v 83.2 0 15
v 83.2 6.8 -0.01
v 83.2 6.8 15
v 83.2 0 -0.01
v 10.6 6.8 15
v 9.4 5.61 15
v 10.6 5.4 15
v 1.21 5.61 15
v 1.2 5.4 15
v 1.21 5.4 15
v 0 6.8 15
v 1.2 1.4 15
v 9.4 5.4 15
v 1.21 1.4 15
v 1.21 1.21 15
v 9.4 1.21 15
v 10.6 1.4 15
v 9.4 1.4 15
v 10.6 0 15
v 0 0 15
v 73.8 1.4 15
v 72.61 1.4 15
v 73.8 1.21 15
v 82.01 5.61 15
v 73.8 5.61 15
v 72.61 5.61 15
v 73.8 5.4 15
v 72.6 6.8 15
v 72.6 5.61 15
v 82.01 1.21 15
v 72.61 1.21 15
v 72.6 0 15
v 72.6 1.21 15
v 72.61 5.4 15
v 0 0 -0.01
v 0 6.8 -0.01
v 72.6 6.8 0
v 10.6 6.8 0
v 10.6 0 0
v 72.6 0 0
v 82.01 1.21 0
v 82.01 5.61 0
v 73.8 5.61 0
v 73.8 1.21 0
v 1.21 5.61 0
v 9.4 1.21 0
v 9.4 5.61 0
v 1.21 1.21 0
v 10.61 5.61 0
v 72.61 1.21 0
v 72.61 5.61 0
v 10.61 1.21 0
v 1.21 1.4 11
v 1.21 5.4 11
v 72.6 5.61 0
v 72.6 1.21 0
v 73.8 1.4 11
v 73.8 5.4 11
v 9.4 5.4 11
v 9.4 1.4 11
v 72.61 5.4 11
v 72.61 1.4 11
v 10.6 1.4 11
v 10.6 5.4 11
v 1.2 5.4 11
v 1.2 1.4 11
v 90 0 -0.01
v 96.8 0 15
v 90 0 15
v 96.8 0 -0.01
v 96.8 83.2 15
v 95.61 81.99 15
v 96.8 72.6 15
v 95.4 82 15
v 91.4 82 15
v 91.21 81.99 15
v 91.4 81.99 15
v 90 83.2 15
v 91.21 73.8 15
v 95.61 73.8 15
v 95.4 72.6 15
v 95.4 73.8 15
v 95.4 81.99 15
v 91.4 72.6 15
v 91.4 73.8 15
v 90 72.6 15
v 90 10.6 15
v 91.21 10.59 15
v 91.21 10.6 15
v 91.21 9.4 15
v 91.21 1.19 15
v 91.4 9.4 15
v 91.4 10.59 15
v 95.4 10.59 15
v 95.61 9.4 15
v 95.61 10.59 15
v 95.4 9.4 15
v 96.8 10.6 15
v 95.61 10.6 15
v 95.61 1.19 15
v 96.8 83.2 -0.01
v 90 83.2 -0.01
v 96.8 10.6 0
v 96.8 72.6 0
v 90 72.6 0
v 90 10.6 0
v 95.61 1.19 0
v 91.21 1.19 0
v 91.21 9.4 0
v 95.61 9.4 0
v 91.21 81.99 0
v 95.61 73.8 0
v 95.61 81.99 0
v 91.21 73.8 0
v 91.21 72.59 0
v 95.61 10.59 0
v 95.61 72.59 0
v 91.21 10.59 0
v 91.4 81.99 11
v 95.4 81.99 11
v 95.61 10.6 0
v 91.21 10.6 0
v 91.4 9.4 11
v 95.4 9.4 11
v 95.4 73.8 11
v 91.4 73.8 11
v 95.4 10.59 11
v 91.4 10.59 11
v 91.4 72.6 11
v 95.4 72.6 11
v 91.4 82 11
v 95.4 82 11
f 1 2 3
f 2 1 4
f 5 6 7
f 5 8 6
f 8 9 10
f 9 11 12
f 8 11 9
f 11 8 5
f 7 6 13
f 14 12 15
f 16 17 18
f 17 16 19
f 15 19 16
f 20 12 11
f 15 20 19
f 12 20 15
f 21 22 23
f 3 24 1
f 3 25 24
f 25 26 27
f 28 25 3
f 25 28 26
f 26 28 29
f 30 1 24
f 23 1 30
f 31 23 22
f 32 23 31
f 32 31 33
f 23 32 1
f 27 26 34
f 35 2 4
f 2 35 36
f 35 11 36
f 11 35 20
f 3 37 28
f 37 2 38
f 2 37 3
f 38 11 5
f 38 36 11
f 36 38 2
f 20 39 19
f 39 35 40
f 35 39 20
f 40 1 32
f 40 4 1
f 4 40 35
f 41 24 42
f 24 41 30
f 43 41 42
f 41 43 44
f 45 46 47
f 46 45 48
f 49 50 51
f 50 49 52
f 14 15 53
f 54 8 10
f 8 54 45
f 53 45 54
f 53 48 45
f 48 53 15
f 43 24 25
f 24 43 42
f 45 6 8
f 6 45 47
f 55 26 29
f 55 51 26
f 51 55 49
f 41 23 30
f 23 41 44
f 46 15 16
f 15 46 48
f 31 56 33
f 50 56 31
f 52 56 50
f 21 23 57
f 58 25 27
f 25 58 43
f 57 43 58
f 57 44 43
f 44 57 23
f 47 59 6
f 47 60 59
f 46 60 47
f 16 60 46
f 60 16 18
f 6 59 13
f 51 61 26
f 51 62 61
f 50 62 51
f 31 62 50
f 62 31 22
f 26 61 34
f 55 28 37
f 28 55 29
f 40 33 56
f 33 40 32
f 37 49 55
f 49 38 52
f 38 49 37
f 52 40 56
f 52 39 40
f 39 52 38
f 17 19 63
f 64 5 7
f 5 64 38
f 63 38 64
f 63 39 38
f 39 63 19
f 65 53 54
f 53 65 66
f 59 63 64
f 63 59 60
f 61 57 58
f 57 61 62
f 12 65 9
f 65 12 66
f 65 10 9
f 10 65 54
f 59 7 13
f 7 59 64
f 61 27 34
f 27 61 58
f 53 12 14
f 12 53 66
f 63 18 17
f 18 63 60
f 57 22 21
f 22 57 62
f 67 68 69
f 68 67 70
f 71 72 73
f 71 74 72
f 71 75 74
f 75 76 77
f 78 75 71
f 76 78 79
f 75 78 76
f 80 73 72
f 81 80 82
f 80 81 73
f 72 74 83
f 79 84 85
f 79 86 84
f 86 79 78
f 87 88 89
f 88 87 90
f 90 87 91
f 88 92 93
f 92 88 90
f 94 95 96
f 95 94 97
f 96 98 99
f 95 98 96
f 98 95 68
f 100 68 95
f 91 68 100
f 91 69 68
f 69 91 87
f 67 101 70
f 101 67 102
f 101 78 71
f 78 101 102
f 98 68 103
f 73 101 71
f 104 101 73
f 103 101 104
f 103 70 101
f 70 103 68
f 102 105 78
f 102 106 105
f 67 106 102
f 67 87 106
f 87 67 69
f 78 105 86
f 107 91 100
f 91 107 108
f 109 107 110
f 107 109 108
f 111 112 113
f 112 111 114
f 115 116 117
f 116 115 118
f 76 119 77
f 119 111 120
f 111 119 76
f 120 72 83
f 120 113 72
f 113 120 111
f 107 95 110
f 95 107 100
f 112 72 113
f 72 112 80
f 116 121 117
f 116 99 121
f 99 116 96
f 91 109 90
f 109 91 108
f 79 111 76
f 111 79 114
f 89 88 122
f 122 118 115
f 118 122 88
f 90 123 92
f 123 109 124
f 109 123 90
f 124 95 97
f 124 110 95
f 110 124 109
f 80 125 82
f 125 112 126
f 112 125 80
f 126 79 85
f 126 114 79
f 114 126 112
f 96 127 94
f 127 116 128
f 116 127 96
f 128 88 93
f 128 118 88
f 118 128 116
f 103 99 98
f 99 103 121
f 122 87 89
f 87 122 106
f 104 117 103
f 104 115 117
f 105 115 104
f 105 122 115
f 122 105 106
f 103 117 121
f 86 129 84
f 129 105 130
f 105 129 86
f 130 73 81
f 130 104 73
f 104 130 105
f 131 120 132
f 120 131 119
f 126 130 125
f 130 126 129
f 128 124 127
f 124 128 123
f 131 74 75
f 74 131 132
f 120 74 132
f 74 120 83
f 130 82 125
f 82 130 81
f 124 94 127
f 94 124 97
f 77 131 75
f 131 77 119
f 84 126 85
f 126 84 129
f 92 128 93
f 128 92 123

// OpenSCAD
// file: ../../Base/Boxes.scad
// Fischertechnik Box Foundation
// Pre-designed Boxes

use <Constants.scad>

include <PlacementOptions.scad>

box190Width = 190;
box190Depth = 130;
box130Width = 130;
box130Depth = 95;

// Values are from an original ec3 box
topBottomDifference = 1.5;
outerHeight = 40;
baseThickness = 1.8;
innerHeight = outerHeight - baseThickness;
stackExcess = 5.7;
radius = 3.5;
wallThickness = 1.5;
tolerance = 0.2;

boxWallThickness = wallThickness;
boxBaseThickness = baseThickness;
boxWebWidth = 3.0;

// getBoxWallThickness()
// Gets the wall thickness of a Fischertechnik Box
function getBoxWallThickness() = boxWallThickness;

// getBoxUsageHeight(height = 38.2)
// Gets the usable height of a Fischertechnik box
// height = Outer height of the box from the bottom to the upper edge.
function getBoxUsageHeight(height = outerHeight) = height - baseThickness - stackExcess;

// getBoxInnerHeight()
// Gets the inner height of a Fischertechnik box, including the stack excess
function getBoxInnerHeight() = innerHeight;

// getBoxBaseThickness()
// Gets the thickness of the Fischertechnik box base.
function getBoxBaseThickness() = boxBaseThickness;

// getBoxWebWidth()
// Gets the width of a box web
function getBoxWebWidth() = boxWebWidth;

// getBox190Space()
// Gets the usable inner space of a Box 190 as an x/y-list
function getBox190Space() = [
    box190Width - 2*getBoxWallThickness() - topBottomDifference, 
    box190Depth - 2*getBoxWallThickness() - topBottomDifference ];

// RoundedCornerPlate(width, depth, height, radius)
// Creates a body plate with rounded corners for a box. Used
// also to create the complete box with the hull module.
// width = Width of the plate
// depth = depth of the plate 
// height = thickness of the plate
// radius = radius of the rounded corner
module RoundedCornerPlate(width, depth, height, radius) {
    translate([radius, radius])
    hull() {
        w = width-2*radius;
        d = depth-2*radius;
        cube([w, d, height]);
        cylinder(height, r=radius, $fn=getFragments());
        translate([w, 0])
            cylinder(height, r=radius, $fn=getFragments());
        translate([w, d])
            cylinder(height, r=radius, $fn=getFragments());
        translate([0, d])
            cylinder(height, r=radius, $fn=getFragments());
    }
}

// BoxBase(width, depth)
// Creates an empty stackable Fischertechnik compatible box
// width = Outer width of the box (190, 130, ...)
// depth = Outer depth of the box (130, 95, ...)

module BoxBase(width, depth, height=outerHeight) {    
    thinPlate = 0.01;

    innerHeight = height - baseThickness;    
    
    module Body(tolerance=tolerance) {
        hull() {
            // Bottom with tolerance to fit into the original boxes when stacked
            translate([-wallThickness+tolerance, -wallThickness+tolerance, -baseThickness])
                RoundedCornerPlate(width-topBottomDifference-2*tolerance, depth-topBottomDifference-2*tolerance, thinPlate, radius);
            
            // Top
            translate([-wallThickness-topBottomDifference/2, -wallThickness-topBottomDifference/2, innerHeight-thinPlate])
                RoundedCornerPlate(width, depth, thinPlate, radius);
         }
    }

    module Cutoff() {
        hull() {
            coWidth = width - 2*wallThickness;
            coDepth = depth - 2*wallThickness;
            
            // Bottom
            RoundedCornerPlate(coWidth-topBottomDifference, coDepth-topBottomDifference, thinPlate, radius);

            // Top
            translate([-topBottomDifference/2, -topBottomDifference/2, innerHeight+thinPlate]) 
                RoundedCornerPlate(coWidth, coDepth, thinPlate, radius);
        }
    }
    
    difference() {        
        Body();
        Cutoff();
        stackOffset = innerHeight - stackExcess;
        translate([0, 0, stackOffset + baseThickness])
            Body(tolerance=0);
    }
}

// Creates the Fischertechnik empty box 130x190 mm and places it at position 0,0
// 190x130 are the outer sizes, the inner space is slightly smaller. Use getBox190Space() to get the inner sizes.
// The box is positioned that the usable inner space is at the 0,0,0 position.

module Box190() {
    BoxBase(box190Width, box190Depth);
}

// Gets the usable inner space of a Box 130 as an x/y-list
function getBox130Space() = [
    box130Width - 2*getBoxWallThickness() - topBottomDifference, 
    box130Depth - 2*getBoxWallThickness() - topBottomDifference ];

// Creates the Fischertechnik empty box 95x130 mm and places it at position 0,0
// 190x130 are the outer sizes, the inner space is slightly smaller. Use getBox190Space() to get the inner sizes.
// The box is positioned that the usable inner space is at the 0,0,0 position.

module Box130() {
    BoxBase(box130Width, box130Depth);
}

// Creates a web at the specified box walls
// corner 0 = LowerLeft, 1 = UpperLeft, 2 = UpperRight, 3 = LowerRight
// side 0 = LeftOfCorner, 1 = RightOfCorner
// distance = Distance in mm from the corner
// boxSpace = inner width and depth of the box (default: Box 190)
// webWidth = length of the web (default is 3 mms)
// webThickness = thickness of the web (default is 1 mm)
// height = Height of the web (standard is getBoxUsageHeight())
// sink = How much of the web is sunk into the wall

module BoxWeb(
    corner, 
    side, 
    distance, 
    boxSpace=getBox190Space(), 
    webWidth=getBoxWebWidth(), 
    webThickness=1.0, 
    height=getBoxUsageHeight(),
    sink = getBoxWallThickness()/2) {
    width = (corner % 2 == 0) ? 
            (side == LeftOfCorner ? webWidth : webThickness) :
            (side == LeftOfCorner ? webThickness : webWidth);

    depth = (corner % 2 == 0) ? 
            (side == RightOfCorner ? webWidth : webThickness) :
            (side == RightOfCorner ? webThickness : webWidth);
    
    xDiff = corner == LowerLeft ? 
                (side == LeftOfCorner ? -sink : distance) :
            (corner == UpperLeft ?                
                (side == LeftOfCorner ? distance : -sink) :
            (corner == UpperRight ?
                (side == LeftOfCorner ? boxSpace.x-webWidth+sink : boxSpace.x-distance-webThickness) :
                (side == LeftOfCorner ? boxSpace.x-distance-webThickness: boxSpace.x-webWidth+sink)));

    yDiff = corner == LowerLeft ? 
                (side == RightOfCorner ? -sink : distance) :
            (corner == UpperLeft ?
                (side == RightOfCorner ? boxSpace.y-distance-webThickness : boxSpace.y-webWidth+sink) :
            (corner == UpperRight ?
                (side == RightOfCorner ? boxSpace.y-webWidth+sink : boxSpace.y-distance-webThickness) :
                (side == RightOfCorner ? distance : -sink)));
    
    translate([xDiff, yDiff, -getExcess()])
        cube([width, depth, height + 2*getExcess()]);
}
// file: ../../Base/Rotation.scad
// Fischertechnik Box Foundation
// Geometry Helpers Rotation

include <PlacementOptions.scad>

// getRotatedSpace(space, rotation=NoRotation)
// Rotates the space dependent on the specified rotation

function getRotatedSpace(space, rotation=NoRotation) = [
    (rotation == Rotate90 || rotation == Rotate270) ? space.y : space.x,
    (rotation == Rotate90 || rotation == Rotate270) ? space.x : space.y
];

// Rotates the given space around the fixed left lower corner
// space = the space the children needs as width/depth list [width,depth]
// rotation = 0 Rotate0 degrees, 1 Rotate90 degrees, 2 Rotate180 degrees, 3 Rotate270 degrees (equivalent to -90)

module RotateFix(space, rotation=NoRotation) {
    dy = (rotation == Rotate0 || rotation == Rotate270) ? 0 :
        (rotation == Rotate90) ? space.x :
        space.y;
    dx = (rotation < Rotate180) ? 0 :
        (rotation == Rotate180) ? space.x :
        space.y;
    
    translate([dx, dy, 0])
        rotate([0, 0, rotations[rotation]])
            children();
}
// file: ../../Base/Alignment.scad
// Fischertechnik Box Foundation
// Geometry Helpers Alignment

include <PlacementOptions.scad>

// getAlignedX(elementWidth, spaceWidth, align=AlignRight, offset=0)
// Gets the aligned X offset of an element with the given
// width in the given space.
// elementWidth = The width of the element to positon
// spaceWidth = The space where the element should be aligned
// align = 0 AlignLeft, 1 AlignCenter, 2 AlignRight
// offset = an optional offset from the aligned position. When
// aligned left or centered, then positive values are in X direction.
// When aligned right then positive values are in negative X direction.

function getAlignedX(elementWidth, spaceWidth, align=AlignRight, offset=0) =
    (align == AlignLeft) ?
        offset :
        ((align == AlignCenter) ?
        (spaceWidth - elementWidth)/2 + offset :
        spaceWidth - offset - elementWidth);

// getAlignedY(elementDepth, spaceDepth, align=AlignTop, offset=0)
// Gets the aligned Y offset of an element with the given
// depth in the given space.
// elementDepth = The depth of the element to positon
// spaceDepth = The space where the element should be aligned
// align = 0 AlignBottom, 1 AlignCenter, 2 AlignTop
// offset = an optional offset from the aligned position. When
// aligned bottom or centered, then positive values are in Y direction.
// When aligned top then positive values are in negative Y direction.

function getAlignedY(elementDepth, spaceDepth, align=AlignTop, offset=0) =
    (align == AlignBottom) ?
        offset :
        ((align == AlignCenter) ?
        (spaceDepth - elementDepth)/2 + offset :
        spaceDepth - offset - elementDepth);
// file: ../../Base/Constants.scad
// Fischertechnik Box Foundation
// Constants

// Constant values necessary for multiple elements

// Base constants
dividerThickness = 1.2;
excess = 0.01;
fragments = 90;
tolerance = 0.8;

// Gets the thickness of a divider 
function getDividerThickness() = dividerThickness;

// Gets the excess that is used to merge walls into each other
function getExcess() = excess;

// Gets amount of fragments of a cylinder
function getFragments() = fragments;

// Gets the inner tolerance of a frame to each side
function getTolerance() = tolerance;


// Fischertechnik specific constants
axisDiameter = 4;
axisBottomDiameter = axisDiameter + 1;
axisTolerance = 0.2;
axisLockingLength = 8;

// Gets axis diameter of Fischertechnik axis
function getAxisDiameter() = axisDiameter;

// Gets axis diameter tolerance (subtracted for element axis)
function getAxisTolerance() = axisTolerance;

// Gets the axis diameter for standing axis
function getStandAxisDiameter() = getAxisDiameter() - getAxisTolerance();

// Gets axis bottom diameter for thicker part at the bottom
function getAxisBottomDiameter() = axisBottomDiameter;

// Gets the lengthh of the locking part of a locking axis
function getAxisLockingLength() = axisLockingLength;

// Studs

studHeight = 2.5;
studTolerance = 0.2;
studRailDistance = 9;   // as in ft 50

// gets the height of a connecting stud
function getStudHeight() = studHeight;

// gets the connecting stud height tolerance
function getStudTolerance() = studTolerance;

// gets the default rail distance for studs
function getStudRailDistance() = studRailDistance;

// Dockable Frame with Edge

standardEdgeDistance = 2.5;
standardWebDistance = 11.5;
standardCornerLength = 15;

// gets the standard distance to the wall of the box for dockable frames with webs
function getStandardEdgeDistance() = standardEdgeDistance;

// gets the standard distance of each web to the corner of the dockable frame
function getStandardWebDistance() = standardWebDistance;

// gets the standard length of the corner walls of a dockable frame
function getStandardCornerLength() = standardCornerLength;

// Tubes

tubeWallFactor = 0.8;

// gets the wall thickness of a tube.
function getTubeWallThickness() = tubeWallFactor * getDividerThickness();

// Small Parts and Divider Frame

smallPartsFrameHeight = 20;

// gets the frame height for docked small parts boxes.
function getSmallPartsFrameHeight() = smallPartsFrameHeight;

// Hubs

hubRingDiameter = 19.5;
hubRingLevelDiameter = 21;

// gets the diameter of a tube matching the inner ring of a wheel
function getHubRingDiameter() = hubRingDiameter;

// gets the diameter of a hub tube with a thicker diameter
function getHubRingLevelDiameter() = hubRingLevelDiameter;

// Struts

strutAddLength = 9.0;
strutDepth = 8.0;

// gets the full length of a strut
function getFullStrutLength(length) = length + strutAddLength;

// gets the radius of the end of a strut
function getStrutEndRadius() = strutAddLength / 2;

// gets the the depth of a strut
function getStrutDepth() = strutDepth;

// Propeller

propellerAxisDiameter = 7.0;
propellerAxisTolerance = 0.2;

// gets the propeller axis outer diameter
function getPropellerAxisDiameter() = propellerAxisDiameter;

// gets the propeller axis printing tolerance
function getPropellerAxisTolerance() = propellerAxisTolerance;
// file: ../../Base/PlacementOptions.scad
// Fischertechnik Box Foundation
// Placement Options

// Alignment
NoAlign = 0;
AlignLeft = 1;
AlignBottom = 2;
AlignCenter = 3;
AlignRight = 4;
AlignTop = 5;

// Element rotation degree steps
rotations = [0, -90, -180, -270];

// Rotation
NoRotation = 0;
Rotate0 = 0;
Rotate90 = 1;
Rotate180 = 2;
Rotate270 = 3;

// Docking (seen from above)
NoDock = -1;
DockLeft = 0;
DockTop = 1;
DockRight = 2;
DockCorner = 2;
DockBottom = 3;

// Web corners
LowerLeft = 0;
UpperLeft = 1;
UpperRight = 2;
LowerRight = 3;

// Web position relative to corner
LeftOfCorner = 0;
RightOfCorner = 1;

// Rails direction
Horizontal = true;
Vertical = false;
// file: ../../Elements/FrameAxis80.scad
// Fischertechnik Box Library
// Frame for single 80 mm Axis
// 37384

use <../ModelBase/Complex.scad>

/* [Element Parameters] */
count = 1;

/* [Hidden] */
length = 80;

// getFrameAxis80Space(count=1)
// Gets the width (.x) and depth (.y) of the axis frame.
// count = Count of axis

function getFrameAxis80Space(count=1) = getFrameAxisSpace(length, count);

// FrameAxis80(count=1)
// Axis holder for a single 80 mm axis.
// count = Count of axis

module FrameAxis80(count=1) {
    FrameAxis(length, count);
}

// Test
color("lightgray")
FrameAxis80(count);
// file: ../../Base/Placement.scad
// Fischertechnik Box Foundation
// Geometry Helpers Placement

use <Constants.scad>
use <Alignment.scad>
use <Rotation.scad>
use <Boxes.scad>

include <PlacementOptions.scad>

// Place(x=0, y=0, elementSpace=[0,0], alignX=AlignLeft, alignY=AlignBottom, rotation=Rotate0, boxSpace=getBox190Space())
// Places the child at the specified position
// y = Y-Position. This is a relative position when an X aligment is specified.
// x = X-Position. This is a relative position when an Y aligment is specified.
// elementSpace = space of the element to be placed [x,y]
// alignX = -1=NoAlign, 0 AlignLeft, 1 AlignCenter, 3 AlignRight (elementSpace and boxSpace required!)
// alignY = -1=NoAlign, 2 AlignBottom, 1 AlignCenter, 4 AlignTop (elementSpace and boxSpace required!)
// rotation = 0 Rotate0 0 degrees, 1 Rotate90 90 degrees, 
// 2 Rotate180 180 degrees, 3 Rotate270 270 degrees (equivalent to -90)
// boxSpace = Inner space of the box where the placement occurs [x,y] - default is Box 190x130 inner space

module Place(x=0, y=0, elementSpace=[0,0], 
  alignX=AlignLeft, alignY=AlignBottom, 
  rotation=NoRotation, boxSpace=getBox190Space()) {

    module Position(x, y, space, rotation=Rotate0) {
        translate([x, y, 0])
            RotateFix(space, rotation)
                children();
    }

    space = getRotatedSpace(elementSpace, rotation);
    alignedX = getAlignedX(space.x, boxSpace.x, alignX, x);
    alignedY = getAlignedY(space.y, boxSpace.y, alignY, y);
    Position(alignedX, alignedY, elementSpace, rotation)
        children();
}

// Center(space=getBox130Space(), elementSpace=[0,0])
// space = Space where the children is centered. For cylinder use centered=true and no elementSpace.
// elementSpace = space of the element to be centered [x,y]

module Center(space=getBox190Space(), elementSpace=[0,0]) {
    Place(elementSpace=elementSpace, boxSpace=space, alignX=AlignCenter, alignY=AlignCenter)
        children();
}

// CenterHorizontal(width=0, y=0, offset=0, space=getBox130Space())
// width = Width of the element to be placed.
// y = Y position of the element
// offset = Offset from the center position (negative will be left of the center)
// space = Space where the element is placed

module CenterHorizontal(width=0, y=0, offset=0, space=getBox190Space()) {
    Place(x=offset, y=y, elementSpace=[width, 0], boxSpace=space, alignX=AlignCenter)
        children(0);
}

// CenterVertical(depth=0, x=0, offset=0, space=getBox130Space())
// depth = Depth of the element to be placed.
// x = X position of the element
// offset = Offset from the center position (negative will be down of the center)
// space = Space where the element is placed

module CenterVertical(depth=0, x=0, offset=0, space=getBox190Space()) {
    Place(x=x, y=offset, elementSpace=[0, depth], boxSpace=space, alignY=AlignCenter)
        children(0);
}

// getIsVertical(align)
// True if the specified alignment needs a vertical orientation for a divider (AlignRight, AlignLeft)

function getIsVertical(align) = (align == AlignRight || align == AlignLeft);

// getIsHorizontal(align)
// True if the specified alignment needs a horizontal orientation for a divider (AlignTop, AlignBottom)

function getIsHorizontal(align) = (align == AlignTop || align == AlignBottom);
// main file
// Fischertechnik Box Foundation
// Elements
// Test FrameAxis80

use <../../Base/Placement.scad>
use <../../Elements/FrameAxis80.scad>

include <../../Base/PlacementOptions.scad>

count=1;

FrameAxis80(count);

Place(90, 0, elementSpace=getFrameAxis80Space(count), rotation=Rotate90)
    FrameAxis80(count);
